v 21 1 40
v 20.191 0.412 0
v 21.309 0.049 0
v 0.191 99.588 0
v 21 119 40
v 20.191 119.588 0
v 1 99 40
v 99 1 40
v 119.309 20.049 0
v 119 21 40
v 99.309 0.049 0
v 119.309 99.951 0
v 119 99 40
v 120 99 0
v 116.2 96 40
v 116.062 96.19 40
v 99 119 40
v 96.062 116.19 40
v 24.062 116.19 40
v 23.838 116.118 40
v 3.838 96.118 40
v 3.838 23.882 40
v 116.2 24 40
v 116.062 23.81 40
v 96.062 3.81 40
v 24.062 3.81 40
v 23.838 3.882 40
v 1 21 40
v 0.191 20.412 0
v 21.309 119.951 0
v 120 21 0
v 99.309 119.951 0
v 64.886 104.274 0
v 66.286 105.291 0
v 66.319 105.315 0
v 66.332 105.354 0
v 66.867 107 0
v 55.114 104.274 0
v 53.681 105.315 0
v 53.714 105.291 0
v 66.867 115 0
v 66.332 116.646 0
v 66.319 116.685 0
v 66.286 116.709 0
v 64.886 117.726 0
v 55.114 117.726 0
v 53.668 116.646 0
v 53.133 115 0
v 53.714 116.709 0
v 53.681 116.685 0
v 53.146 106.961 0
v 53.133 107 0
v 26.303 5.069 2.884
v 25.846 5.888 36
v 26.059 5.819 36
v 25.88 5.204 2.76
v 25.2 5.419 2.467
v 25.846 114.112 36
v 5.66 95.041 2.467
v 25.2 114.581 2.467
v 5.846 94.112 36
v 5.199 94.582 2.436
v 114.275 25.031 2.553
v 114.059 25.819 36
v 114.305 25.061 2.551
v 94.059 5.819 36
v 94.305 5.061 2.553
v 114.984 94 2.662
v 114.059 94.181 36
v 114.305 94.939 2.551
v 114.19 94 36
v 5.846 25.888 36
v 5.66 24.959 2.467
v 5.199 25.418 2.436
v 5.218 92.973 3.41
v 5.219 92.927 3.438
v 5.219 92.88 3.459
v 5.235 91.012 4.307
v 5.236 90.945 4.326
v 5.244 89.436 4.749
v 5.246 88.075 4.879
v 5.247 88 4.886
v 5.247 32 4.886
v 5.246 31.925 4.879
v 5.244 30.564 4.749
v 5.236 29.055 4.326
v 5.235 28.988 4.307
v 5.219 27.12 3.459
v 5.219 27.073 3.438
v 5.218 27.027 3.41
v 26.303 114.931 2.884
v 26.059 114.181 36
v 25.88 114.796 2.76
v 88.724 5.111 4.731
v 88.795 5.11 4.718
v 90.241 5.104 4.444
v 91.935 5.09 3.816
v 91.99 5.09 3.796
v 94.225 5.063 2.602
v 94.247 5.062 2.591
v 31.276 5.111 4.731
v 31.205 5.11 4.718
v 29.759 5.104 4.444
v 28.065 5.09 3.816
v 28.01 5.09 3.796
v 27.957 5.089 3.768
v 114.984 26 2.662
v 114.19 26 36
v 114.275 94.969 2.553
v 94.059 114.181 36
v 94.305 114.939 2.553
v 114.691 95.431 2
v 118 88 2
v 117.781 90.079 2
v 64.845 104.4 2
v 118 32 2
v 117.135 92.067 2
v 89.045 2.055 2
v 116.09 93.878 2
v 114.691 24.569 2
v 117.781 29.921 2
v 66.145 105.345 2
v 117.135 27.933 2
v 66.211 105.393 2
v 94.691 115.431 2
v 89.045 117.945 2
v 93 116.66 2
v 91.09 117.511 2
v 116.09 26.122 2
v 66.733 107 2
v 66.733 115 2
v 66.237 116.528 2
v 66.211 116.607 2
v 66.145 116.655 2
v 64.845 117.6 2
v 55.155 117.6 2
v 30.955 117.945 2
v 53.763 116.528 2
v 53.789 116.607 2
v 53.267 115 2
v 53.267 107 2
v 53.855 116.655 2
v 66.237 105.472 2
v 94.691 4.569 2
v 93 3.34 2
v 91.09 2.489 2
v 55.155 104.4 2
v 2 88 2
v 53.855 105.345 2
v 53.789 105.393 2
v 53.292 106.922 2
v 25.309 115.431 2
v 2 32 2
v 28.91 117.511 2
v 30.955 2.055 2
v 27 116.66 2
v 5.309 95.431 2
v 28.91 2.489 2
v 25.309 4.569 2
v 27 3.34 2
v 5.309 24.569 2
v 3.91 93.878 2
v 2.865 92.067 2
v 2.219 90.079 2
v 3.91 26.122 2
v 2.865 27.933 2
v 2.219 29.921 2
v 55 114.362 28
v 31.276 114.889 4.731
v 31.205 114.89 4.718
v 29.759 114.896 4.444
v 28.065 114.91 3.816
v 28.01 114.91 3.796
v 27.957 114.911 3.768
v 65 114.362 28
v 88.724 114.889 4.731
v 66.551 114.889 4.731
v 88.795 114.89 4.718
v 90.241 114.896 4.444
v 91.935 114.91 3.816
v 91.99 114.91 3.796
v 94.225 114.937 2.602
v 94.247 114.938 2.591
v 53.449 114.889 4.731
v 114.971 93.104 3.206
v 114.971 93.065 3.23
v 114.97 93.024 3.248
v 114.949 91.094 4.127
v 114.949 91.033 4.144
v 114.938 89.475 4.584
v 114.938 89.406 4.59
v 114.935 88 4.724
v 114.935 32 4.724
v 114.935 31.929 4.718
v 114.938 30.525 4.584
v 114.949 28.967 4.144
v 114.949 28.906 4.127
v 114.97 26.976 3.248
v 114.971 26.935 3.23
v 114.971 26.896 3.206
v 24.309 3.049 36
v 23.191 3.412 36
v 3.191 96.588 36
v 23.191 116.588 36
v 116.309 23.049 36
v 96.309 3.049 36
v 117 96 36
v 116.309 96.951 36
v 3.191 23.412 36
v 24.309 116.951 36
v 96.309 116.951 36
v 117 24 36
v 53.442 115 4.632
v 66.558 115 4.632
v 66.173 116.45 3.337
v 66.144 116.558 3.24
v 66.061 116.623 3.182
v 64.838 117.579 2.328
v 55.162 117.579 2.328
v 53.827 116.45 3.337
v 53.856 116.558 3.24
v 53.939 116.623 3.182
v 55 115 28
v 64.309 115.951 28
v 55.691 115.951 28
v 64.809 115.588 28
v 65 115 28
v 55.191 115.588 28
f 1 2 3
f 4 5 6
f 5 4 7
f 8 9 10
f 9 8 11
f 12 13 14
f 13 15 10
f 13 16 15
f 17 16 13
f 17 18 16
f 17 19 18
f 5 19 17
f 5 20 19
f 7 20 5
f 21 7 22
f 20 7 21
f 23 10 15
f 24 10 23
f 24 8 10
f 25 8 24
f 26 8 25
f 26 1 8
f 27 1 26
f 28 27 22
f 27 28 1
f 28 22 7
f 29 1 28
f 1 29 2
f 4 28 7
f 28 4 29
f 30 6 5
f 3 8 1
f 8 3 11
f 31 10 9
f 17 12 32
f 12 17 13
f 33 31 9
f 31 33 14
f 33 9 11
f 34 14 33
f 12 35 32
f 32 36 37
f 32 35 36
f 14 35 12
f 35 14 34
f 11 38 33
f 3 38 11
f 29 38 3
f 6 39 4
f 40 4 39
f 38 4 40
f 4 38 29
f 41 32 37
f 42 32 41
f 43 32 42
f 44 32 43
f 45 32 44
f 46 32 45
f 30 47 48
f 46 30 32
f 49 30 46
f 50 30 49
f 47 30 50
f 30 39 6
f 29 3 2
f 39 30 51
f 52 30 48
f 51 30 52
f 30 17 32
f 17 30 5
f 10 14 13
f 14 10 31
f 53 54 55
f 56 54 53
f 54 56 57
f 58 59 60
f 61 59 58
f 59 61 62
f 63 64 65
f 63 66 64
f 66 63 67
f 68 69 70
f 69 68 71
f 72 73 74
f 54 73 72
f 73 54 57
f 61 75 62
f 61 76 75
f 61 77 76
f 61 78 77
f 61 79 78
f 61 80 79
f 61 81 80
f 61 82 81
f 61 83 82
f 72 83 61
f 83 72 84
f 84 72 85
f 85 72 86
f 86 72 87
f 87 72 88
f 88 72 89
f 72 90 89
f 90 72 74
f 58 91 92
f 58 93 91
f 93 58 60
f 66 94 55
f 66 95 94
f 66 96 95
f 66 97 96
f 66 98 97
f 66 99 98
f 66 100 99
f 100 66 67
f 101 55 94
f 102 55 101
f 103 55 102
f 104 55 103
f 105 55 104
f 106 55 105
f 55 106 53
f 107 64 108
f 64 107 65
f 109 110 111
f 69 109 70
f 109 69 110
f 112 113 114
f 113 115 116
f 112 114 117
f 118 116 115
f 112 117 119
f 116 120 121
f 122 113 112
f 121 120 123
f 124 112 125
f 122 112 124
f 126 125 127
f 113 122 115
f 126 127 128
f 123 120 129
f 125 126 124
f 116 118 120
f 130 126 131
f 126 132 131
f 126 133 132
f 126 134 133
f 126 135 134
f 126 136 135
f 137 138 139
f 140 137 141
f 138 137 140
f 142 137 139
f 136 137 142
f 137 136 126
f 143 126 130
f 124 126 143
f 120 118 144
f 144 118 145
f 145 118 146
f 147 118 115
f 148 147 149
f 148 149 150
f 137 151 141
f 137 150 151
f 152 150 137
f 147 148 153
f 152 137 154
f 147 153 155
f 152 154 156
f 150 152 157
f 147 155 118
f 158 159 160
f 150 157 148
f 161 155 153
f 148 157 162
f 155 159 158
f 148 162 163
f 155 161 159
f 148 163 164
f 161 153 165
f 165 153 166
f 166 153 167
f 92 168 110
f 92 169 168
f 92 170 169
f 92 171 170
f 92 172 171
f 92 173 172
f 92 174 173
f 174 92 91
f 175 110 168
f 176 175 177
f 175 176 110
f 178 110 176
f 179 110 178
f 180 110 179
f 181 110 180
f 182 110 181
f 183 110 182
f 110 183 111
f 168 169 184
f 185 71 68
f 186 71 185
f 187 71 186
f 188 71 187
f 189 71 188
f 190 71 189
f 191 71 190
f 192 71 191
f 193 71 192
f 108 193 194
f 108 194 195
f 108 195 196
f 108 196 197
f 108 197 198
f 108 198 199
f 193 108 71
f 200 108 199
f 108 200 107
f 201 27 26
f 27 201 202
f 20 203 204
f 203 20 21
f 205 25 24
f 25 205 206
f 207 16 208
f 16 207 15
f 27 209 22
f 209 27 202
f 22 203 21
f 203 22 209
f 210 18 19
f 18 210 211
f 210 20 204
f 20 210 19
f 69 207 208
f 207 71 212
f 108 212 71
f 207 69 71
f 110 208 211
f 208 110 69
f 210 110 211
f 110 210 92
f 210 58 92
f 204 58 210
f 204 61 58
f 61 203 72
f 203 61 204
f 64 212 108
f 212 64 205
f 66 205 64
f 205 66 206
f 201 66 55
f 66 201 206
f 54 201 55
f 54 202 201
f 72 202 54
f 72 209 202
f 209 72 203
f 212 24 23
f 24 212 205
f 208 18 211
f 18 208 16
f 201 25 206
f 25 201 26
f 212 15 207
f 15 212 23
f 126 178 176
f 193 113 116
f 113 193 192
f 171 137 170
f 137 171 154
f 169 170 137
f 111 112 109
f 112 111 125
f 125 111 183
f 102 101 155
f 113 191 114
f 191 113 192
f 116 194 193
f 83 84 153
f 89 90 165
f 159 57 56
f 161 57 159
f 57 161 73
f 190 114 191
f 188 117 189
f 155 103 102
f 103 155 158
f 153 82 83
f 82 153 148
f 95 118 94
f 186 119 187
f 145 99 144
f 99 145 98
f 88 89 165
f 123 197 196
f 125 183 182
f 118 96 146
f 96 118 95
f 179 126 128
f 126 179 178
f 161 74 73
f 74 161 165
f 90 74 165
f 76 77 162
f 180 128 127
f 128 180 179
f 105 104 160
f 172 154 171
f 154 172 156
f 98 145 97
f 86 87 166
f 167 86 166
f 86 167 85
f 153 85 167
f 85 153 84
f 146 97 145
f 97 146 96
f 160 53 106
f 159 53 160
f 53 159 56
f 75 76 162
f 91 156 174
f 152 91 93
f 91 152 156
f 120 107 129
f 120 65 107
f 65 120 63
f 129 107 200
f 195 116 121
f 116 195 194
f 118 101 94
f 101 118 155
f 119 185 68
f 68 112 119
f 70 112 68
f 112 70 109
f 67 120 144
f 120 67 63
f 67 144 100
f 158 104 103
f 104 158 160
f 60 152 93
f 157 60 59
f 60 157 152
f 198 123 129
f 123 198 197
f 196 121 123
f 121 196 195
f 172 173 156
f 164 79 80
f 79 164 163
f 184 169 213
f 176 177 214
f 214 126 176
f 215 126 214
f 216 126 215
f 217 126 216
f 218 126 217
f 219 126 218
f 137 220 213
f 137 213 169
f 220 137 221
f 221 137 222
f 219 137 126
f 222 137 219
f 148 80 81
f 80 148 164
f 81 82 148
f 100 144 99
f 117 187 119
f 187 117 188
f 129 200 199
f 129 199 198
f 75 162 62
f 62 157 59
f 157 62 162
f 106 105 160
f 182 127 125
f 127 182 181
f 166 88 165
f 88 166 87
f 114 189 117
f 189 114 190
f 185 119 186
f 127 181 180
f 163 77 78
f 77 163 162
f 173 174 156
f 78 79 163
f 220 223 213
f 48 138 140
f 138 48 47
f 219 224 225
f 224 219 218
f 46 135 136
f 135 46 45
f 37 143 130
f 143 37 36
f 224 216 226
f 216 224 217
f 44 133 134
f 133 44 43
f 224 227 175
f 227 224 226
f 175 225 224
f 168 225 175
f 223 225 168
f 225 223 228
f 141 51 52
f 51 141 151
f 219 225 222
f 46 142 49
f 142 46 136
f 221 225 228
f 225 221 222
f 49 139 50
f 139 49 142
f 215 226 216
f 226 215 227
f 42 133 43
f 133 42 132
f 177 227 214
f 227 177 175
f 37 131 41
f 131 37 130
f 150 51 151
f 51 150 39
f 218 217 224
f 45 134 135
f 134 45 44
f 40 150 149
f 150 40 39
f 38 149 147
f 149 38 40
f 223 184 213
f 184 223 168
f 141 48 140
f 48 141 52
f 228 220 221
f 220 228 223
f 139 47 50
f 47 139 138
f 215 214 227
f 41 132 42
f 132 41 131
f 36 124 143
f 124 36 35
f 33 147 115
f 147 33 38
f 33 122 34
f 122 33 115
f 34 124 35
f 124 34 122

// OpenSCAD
height = 40; 
side_length_global = 80;
corner_offset_global = 20;
abs_width_x = corner_offset_global * 2 + side_length_global;
abs_width_y = corner_offset_global * 2 + side_length_global;

module create_box_outline(sidewall_offset=0, cut_corner_offset=0, vertical_mod = 0, height_mod = height, radius = 1, radius2 = 0){
    if(radius2 == 0){
        radius2 = radius;
    }
    edge_inset = corner_offset_global + cut_corner_offset;
    side_length = side_length_global + sidewall_offset;
    side_offset = side_length + edge_inset;
    
    point1 = [edge_inset,0,0];
    point2 = [0,edge_inset,0];
    point3 = [side_offset,0,0];
    point4 = [side_offset + edge_inset, edge_inset,0];
    point5 = [side_offset + edge_inset, side_offset ,0];
    point6 = [side_offset,side_offset + edge_inset,0];
    point7 = [edge_inset,side_offset + edge_inset,0];
    point8 = [0,side_offset,0];
    points = [ point1, point2, point3, point4, point5, point6, point7, point8 ];
    translate([-(sidewall_offset + cut_corner_offset * 2)/2,-(sidewall_offset + cut_corner_offset * 2)/2,vertical_mod]) c3_outline(points,radius, radius2,height_mod);
}

 
module c3_outline(points, radius, radius2, height ){
    

    hull(){
        translate([radius,radius,0]) translate(points[0]) cylinder(r1=radius,r2=radius2, h=height);
        translate([radius, radius,0]) translate(points[1]) cylinder(r1=radius,r2=radius2, h=height);
        translate([-radius, radius,0])translate(points[2]) cylinder(r1=radius,r2=radius2, h=height);
        translate([-radius, radius,0]) translate(points[3]) cylinder(r1=radius,r2=radius2, h=height);
        translate([-radius, -radius,0]) translate(points[4]) cylinder(r1=radius,r2=radius2, h=height);
        translate([-radius, -radius,0])translate(points[5]) cylinder(r1=radius,r2=radius2, h=height);
        translate([radius, -radius,0]) translate(points[6]) cylinder(r1=radius,r2=radius2, h=height);
        translate([radius, -radius,0]) translate(points[7]) cylinder(r1=radius,r2=radius2, h=height);
    }
}

difference(){
    //make the box
    color("blue") create_box_outline(mod_height=height);
    // Make a big cutout in the middle of the box
    create_box_outline(sidewall_offset = -10,cut_corner_offset=0, vertical_mod = 2, height_mod = 2 + height);
    // Make the top lip for the mirror
    create_box_outline(sidewall_offset = -6,cut_corner_offset=0, vertical_mod = height - 4, height_mod = 5);
    // Make the bottom lip for the mirror
    create_box_outline(sidewall_offset = -4,cut_corner_offset=0, vertical_mod = 2, height_mod = 8, radius = 10, radius2 = 1);
    // Make a hole for the wiring on this prototype
    translate([0,abs_width_y/2 - 9,0]) create_box_outline(sidewall_offset = -side_length_global -2,cut_corner_offset=-corner_offset_global/2 - 2, vertical_mod = -2, height_mod = height - 10, radius=3, radius2=1);
    //cube([10,10,85]);
}

echo("The size of the cube is");
echo(abs_width_x);
